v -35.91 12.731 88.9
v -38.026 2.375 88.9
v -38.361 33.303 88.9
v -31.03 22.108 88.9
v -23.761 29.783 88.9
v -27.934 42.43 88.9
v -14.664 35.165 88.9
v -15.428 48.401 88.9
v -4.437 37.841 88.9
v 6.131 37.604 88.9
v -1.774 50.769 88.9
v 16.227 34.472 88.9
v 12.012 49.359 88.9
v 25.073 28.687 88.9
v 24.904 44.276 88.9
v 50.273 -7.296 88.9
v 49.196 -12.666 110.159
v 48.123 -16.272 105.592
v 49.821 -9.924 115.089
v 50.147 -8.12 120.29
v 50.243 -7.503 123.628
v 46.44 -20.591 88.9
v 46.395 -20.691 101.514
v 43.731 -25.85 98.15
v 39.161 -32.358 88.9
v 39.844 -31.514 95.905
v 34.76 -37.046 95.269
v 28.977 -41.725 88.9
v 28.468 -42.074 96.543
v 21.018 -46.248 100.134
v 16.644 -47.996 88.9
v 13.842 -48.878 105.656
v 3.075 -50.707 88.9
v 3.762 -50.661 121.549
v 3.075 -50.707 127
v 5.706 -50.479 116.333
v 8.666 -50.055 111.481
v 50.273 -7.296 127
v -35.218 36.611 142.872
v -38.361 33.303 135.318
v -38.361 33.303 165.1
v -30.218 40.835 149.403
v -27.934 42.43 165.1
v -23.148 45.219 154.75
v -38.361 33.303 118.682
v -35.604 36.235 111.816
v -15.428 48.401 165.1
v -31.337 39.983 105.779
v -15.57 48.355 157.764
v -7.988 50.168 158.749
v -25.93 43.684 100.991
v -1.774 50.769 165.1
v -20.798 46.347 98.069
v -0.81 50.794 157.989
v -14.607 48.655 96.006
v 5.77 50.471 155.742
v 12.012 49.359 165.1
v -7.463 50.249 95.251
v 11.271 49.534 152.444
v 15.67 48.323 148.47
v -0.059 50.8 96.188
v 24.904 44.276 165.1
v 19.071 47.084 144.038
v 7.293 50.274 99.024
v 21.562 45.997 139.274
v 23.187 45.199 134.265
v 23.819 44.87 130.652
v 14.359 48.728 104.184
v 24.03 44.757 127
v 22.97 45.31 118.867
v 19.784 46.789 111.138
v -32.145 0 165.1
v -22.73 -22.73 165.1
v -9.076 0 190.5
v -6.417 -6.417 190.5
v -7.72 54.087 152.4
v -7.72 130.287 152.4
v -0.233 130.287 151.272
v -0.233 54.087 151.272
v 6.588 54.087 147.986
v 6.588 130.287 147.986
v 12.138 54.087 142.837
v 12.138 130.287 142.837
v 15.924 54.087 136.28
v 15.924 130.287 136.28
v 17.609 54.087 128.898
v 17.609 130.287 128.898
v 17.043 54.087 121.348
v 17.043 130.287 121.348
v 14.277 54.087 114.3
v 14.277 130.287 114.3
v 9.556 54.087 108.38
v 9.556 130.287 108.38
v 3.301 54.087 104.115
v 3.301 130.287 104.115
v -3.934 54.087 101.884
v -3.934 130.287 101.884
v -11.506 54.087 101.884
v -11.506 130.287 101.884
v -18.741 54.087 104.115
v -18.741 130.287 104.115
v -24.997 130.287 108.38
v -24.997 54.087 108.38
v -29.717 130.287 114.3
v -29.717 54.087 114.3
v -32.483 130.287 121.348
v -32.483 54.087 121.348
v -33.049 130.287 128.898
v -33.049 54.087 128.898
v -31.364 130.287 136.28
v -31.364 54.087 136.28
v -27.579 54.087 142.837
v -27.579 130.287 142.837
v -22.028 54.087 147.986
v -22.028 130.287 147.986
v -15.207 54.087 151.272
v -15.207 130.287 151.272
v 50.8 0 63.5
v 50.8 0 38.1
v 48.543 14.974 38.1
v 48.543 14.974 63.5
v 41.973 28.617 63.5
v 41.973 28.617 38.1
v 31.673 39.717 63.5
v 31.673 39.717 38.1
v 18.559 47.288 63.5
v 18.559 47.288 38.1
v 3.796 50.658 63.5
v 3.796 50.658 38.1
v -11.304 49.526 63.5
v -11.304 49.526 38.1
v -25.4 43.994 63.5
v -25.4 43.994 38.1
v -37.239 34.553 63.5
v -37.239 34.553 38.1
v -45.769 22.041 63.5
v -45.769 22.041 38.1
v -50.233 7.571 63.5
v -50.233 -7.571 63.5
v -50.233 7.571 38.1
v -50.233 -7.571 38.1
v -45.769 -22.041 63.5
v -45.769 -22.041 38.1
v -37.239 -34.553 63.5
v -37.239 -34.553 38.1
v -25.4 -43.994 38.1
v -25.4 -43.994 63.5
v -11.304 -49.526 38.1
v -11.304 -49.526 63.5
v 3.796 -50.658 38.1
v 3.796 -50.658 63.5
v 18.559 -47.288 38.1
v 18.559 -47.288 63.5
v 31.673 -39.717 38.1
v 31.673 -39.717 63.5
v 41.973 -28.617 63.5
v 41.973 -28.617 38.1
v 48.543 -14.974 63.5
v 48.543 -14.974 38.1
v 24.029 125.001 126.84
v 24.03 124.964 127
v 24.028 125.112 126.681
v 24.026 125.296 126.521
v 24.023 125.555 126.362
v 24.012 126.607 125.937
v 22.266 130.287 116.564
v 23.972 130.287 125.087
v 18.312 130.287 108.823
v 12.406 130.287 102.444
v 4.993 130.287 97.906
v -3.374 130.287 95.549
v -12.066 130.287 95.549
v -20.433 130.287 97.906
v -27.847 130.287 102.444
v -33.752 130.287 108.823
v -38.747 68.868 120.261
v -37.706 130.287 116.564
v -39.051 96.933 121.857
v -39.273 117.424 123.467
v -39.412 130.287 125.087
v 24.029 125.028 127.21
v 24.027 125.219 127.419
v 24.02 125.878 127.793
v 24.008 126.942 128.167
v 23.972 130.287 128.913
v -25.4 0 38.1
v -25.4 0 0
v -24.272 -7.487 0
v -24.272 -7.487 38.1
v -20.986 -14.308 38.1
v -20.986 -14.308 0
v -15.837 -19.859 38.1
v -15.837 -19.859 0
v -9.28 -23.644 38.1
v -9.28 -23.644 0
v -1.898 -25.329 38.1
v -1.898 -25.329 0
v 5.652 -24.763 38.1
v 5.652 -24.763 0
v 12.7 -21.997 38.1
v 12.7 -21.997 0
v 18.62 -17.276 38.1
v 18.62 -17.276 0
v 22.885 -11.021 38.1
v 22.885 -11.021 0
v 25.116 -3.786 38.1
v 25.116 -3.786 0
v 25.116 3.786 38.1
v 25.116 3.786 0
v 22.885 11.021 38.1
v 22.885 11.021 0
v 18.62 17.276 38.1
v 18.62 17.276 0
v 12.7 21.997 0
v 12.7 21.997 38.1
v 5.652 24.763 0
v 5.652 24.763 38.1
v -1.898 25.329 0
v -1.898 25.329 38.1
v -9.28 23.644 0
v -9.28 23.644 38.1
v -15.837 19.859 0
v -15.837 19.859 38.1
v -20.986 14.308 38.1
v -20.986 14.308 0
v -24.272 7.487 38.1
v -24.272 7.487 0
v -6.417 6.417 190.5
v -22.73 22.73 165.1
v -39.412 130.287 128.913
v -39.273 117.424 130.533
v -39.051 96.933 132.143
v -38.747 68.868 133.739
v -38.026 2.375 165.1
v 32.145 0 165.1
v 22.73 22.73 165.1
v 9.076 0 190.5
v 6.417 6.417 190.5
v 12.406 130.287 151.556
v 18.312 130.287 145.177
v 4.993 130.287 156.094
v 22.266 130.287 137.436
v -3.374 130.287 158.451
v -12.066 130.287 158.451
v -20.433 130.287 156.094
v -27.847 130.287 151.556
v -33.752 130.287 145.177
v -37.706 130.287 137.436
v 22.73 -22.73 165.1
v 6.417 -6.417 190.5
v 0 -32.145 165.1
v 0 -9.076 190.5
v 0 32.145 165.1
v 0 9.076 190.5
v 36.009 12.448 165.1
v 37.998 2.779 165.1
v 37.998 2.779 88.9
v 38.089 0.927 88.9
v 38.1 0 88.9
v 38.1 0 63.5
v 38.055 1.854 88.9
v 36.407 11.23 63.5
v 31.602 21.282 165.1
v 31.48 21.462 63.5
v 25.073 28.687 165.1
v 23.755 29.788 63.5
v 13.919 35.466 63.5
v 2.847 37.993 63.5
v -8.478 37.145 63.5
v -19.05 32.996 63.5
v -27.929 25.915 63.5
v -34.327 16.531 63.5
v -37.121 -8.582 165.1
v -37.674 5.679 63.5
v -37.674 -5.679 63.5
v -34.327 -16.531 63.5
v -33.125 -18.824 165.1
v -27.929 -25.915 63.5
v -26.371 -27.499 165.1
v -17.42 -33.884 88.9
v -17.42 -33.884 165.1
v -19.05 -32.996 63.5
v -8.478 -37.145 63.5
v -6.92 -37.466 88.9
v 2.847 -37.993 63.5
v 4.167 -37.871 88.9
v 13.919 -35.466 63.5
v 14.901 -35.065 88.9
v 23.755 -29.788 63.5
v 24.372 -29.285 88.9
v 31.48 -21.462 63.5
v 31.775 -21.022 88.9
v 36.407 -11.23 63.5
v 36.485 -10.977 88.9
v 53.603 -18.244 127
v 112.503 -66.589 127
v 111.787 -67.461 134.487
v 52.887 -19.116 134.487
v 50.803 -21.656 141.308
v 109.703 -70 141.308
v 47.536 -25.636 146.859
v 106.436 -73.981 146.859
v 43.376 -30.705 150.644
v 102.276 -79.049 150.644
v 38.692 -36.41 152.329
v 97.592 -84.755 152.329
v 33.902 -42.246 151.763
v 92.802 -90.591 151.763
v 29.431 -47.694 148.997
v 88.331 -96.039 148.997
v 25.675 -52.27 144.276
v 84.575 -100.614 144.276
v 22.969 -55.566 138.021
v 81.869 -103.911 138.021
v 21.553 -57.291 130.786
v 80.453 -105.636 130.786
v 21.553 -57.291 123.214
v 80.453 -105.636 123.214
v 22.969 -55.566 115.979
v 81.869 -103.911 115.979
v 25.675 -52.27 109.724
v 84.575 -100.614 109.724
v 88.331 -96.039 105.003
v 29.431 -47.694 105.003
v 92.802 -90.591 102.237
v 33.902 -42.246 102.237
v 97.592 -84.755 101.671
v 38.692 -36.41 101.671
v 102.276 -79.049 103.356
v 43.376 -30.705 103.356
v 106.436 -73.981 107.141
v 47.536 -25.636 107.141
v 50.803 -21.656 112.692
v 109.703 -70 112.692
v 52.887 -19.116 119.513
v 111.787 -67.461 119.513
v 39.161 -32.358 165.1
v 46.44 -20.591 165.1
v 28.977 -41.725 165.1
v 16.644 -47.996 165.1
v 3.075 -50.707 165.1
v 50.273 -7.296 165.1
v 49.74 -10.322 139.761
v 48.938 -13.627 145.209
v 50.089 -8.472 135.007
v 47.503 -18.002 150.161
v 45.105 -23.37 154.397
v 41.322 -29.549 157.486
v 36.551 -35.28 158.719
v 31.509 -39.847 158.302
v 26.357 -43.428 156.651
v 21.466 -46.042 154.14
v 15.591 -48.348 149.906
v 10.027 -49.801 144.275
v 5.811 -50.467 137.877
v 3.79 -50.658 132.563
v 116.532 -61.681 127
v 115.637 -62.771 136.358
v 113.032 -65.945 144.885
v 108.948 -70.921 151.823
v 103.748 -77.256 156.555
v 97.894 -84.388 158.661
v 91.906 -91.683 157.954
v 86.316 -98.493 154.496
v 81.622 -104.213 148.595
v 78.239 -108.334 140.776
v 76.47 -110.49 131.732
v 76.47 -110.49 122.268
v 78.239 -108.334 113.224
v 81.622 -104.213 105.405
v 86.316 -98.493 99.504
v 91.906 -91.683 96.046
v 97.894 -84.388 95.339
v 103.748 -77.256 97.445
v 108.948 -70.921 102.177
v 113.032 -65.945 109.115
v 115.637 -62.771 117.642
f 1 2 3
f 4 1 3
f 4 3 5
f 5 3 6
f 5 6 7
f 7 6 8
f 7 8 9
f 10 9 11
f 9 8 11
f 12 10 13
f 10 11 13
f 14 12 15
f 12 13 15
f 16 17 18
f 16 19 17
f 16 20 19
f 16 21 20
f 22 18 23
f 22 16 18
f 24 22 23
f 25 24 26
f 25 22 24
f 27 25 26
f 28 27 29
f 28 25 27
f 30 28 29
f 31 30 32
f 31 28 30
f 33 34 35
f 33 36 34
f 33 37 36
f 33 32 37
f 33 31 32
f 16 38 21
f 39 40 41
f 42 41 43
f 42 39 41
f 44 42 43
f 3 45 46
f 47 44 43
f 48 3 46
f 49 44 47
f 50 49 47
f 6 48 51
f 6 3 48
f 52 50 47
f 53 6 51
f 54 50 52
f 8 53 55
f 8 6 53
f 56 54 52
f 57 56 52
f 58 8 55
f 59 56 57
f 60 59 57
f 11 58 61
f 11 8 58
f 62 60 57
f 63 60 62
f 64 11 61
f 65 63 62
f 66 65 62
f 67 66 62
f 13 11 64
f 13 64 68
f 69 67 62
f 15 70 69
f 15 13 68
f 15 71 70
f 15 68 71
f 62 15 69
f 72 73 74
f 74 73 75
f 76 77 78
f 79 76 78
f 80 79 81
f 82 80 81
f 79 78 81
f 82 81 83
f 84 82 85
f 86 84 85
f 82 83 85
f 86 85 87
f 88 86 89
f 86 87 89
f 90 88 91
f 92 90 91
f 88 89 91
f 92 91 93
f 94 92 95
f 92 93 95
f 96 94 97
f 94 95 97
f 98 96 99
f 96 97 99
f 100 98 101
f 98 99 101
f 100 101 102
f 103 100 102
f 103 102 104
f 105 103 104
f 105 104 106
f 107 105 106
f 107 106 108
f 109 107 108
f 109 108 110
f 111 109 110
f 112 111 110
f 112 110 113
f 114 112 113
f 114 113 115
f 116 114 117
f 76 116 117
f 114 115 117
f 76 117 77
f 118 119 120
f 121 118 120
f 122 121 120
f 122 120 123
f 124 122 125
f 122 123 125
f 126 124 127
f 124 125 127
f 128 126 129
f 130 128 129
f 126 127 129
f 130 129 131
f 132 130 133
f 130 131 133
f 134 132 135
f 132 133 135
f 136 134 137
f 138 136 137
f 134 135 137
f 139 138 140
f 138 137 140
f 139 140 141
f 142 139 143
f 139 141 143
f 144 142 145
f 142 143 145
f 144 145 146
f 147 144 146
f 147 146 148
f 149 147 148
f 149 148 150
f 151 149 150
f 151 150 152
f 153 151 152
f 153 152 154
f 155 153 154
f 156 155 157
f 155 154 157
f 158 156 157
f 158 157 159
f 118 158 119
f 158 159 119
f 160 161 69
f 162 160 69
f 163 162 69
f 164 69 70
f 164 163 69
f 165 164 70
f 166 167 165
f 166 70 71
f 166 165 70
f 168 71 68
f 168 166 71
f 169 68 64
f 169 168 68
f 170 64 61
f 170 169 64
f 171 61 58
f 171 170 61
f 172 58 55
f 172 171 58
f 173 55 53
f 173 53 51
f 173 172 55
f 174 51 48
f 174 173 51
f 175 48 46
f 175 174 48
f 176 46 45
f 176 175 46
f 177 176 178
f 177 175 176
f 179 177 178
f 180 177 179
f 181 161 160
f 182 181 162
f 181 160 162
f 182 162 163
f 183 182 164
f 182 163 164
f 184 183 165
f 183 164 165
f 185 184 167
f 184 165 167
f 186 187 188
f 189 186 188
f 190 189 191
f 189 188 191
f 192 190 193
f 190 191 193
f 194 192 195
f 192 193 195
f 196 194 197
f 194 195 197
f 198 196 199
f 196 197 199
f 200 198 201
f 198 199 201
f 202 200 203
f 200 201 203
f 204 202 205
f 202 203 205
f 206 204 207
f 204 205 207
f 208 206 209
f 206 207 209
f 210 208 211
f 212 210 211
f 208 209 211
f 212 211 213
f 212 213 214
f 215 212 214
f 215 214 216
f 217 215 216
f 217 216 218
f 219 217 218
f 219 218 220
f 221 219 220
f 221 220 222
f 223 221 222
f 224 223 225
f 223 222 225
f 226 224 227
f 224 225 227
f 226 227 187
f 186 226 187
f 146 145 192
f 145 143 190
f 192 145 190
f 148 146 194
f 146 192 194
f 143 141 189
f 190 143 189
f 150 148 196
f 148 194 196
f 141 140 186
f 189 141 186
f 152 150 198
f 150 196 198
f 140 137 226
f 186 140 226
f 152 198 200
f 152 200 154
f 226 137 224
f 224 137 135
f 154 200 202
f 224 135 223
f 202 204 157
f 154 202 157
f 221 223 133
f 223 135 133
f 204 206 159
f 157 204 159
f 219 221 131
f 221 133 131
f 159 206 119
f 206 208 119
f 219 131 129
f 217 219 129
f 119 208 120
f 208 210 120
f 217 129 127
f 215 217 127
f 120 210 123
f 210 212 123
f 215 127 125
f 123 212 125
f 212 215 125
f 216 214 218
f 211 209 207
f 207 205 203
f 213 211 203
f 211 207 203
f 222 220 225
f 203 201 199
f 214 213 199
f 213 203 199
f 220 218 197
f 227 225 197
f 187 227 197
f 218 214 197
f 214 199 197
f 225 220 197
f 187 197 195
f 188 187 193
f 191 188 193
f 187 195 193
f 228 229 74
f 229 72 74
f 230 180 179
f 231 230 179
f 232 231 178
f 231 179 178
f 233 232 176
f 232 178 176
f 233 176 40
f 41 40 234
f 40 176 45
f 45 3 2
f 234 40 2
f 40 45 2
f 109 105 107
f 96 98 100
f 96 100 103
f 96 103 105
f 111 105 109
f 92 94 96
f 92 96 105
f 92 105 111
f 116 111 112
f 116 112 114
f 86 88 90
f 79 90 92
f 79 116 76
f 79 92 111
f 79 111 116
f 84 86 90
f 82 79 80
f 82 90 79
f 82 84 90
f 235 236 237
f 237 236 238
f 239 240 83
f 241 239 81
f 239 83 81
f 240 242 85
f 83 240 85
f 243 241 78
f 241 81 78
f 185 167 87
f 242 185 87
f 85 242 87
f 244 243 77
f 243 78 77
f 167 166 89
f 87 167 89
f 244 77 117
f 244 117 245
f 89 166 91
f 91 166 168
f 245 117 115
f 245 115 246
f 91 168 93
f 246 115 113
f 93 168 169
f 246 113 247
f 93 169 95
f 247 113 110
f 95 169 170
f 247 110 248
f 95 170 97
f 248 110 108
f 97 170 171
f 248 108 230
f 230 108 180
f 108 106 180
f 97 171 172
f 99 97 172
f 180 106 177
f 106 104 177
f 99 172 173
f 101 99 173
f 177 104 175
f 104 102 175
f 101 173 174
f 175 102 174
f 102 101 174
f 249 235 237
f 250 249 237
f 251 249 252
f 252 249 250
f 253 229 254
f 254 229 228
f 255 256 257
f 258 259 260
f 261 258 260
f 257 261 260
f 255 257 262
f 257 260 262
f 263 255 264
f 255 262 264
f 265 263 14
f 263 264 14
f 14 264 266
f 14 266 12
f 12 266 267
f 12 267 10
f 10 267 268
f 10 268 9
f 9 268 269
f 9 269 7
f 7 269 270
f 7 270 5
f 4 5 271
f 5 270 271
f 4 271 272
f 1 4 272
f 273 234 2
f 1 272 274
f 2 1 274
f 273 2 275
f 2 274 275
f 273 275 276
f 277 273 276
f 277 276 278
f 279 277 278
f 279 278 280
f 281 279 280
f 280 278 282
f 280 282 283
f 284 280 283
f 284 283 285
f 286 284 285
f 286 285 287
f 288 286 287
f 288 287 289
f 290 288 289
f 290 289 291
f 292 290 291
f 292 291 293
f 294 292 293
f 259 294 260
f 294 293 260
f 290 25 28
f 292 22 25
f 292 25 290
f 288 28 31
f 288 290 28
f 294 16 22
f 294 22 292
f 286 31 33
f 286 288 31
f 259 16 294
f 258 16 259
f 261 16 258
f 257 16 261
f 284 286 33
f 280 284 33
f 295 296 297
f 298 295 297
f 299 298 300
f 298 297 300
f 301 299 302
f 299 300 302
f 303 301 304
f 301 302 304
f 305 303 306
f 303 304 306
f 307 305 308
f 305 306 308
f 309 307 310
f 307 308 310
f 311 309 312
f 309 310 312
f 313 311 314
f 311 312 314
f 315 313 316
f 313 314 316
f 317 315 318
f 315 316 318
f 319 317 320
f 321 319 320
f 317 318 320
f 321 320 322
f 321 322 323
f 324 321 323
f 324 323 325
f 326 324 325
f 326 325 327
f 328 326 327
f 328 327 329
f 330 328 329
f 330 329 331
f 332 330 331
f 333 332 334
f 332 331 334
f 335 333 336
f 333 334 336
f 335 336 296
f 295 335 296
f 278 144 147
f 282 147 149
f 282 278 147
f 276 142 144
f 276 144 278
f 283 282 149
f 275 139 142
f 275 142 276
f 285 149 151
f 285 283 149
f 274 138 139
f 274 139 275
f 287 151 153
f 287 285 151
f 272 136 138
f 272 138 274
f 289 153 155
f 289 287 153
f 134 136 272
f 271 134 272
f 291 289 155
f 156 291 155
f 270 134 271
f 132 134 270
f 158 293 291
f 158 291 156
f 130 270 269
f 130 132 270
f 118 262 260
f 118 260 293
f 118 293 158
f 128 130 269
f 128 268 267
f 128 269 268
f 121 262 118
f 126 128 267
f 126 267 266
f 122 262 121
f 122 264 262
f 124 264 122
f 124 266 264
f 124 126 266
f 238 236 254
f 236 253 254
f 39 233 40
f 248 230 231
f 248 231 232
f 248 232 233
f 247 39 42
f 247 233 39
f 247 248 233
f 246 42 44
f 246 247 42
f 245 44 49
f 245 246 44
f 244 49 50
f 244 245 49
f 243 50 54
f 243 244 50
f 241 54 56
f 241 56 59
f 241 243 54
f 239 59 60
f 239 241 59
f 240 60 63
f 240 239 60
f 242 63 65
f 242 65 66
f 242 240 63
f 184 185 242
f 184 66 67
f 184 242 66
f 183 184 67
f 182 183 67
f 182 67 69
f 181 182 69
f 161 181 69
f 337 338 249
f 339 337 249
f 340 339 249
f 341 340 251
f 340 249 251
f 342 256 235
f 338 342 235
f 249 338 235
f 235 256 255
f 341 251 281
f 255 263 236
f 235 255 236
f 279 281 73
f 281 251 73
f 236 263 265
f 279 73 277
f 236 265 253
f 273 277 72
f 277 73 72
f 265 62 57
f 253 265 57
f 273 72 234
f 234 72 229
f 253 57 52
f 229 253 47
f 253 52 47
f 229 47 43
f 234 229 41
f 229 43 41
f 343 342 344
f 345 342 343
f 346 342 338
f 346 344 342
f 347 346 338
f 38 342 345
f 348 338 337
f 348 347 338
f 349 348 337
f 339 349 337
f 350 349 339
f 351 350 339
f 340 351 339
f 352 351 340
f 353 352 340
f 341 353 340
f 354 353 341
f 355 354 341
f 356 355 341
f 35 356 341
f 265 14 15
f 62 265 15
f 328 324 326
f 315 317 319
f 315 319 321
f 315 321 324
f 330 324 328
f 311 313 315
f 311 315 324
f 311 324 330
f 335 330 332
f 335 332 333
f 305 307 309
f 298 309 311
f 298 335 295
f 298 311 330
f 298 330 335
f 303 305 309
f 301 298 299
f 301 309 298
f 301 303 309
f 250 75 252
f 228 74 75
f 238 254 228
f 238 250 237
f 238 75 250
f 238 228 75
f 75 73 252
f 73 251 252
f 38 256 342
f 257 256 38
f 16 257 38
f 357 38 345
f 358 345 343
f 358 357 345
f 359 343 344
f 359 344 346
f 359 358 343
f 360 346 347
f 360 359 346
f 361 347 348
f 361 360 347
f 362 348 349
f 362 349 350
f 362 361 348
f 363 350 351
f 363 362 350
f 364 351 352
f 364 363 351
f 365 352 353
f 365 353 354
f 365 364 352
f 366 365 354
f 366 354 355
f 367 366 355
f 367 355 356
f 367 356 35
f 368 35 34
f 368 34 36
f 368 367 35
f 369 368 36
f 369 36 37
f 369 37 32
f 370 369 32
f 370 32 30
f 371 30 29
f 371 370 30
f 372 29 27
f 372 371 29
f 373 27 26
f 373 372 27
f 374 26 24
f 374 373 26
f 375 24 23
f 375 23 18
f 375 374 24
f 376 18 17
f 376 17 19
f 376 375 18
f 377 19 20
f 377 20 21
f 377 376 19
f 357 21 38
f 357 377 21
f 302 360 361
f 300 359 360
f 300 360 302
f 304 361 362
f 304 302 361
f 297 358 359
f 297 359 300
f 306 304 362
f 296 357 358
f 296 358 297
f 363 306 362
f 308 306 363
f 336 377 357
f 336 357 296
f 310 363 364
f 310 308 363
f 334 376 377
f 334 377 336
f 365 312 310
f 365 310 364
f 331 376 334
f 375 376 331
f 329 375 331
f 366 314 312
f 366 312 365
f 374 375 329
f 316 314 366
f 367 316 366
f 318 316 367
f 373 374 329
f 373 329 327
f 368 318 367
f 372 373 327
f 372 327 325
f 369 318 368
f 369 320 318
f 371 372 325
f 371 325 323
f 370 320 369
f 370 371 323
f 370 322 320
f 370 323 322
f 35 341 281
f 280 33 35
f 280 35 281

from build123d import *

# Parameters (mm, degrees)
SKETCH1_R               = 25.4
BOSS_EXTRUDE1_DEPTH     = 38.1
SKETCH2_R               = 50.8
BOSS_EXTRUDE2_DEPTH     = 25.4
SKETCH3_R               = 38.1
BOSS_EXTRUDE3_DEPTH     = 101.6
BOSS_EXTRUDE4_START     = -76.2
BOSS_EXTRUDE4_DEPTH     = 76.2
CUT_EXTRUDE1_REACH      = 316.552
CUT_EXTRUDE1_END_RADIUS = 50.8
SKETCH5_W               = 68.464599232
SKETCH5_H               = 81.28
SKETCH5_R               = 31.75
CUT_EXTRUDE2_REACH      = 310.247
CUT_EXTRUDE2_END_RADIUS = 50.8
SKETCH6_W               = 81.28
SKETCH6_H               = 68.58
SKETCH6_R               = 31.75
SKETCH7_R               = 25.4
CUT_EXTRUDE3_DEPTH      = 76.2
SKETCH8_R               = 25.4
CUT_EXTRUDE4_DEPTH      = 76.2
BOSS_EXTRUDE5_DEPTH     = 25.4
BOSS_EXTRUDE5_TAPER     = 40


with BuildPart() as part:
    # Sketch1 → Boss-Extrude1 (new body)
    with BuildSketch(Plane.XY):
        with Locations(Location((0, 0, 0), (0, 0, 180))):
            Circle(SKETCH1_R)
    extrude(amount=BOSS_EXTRUDE1_DEPTH)

    # Sketch2 → Boss-Extrude2 (add)
    with BuildSketch(Plane.XY.offset(38.1)):
        Circle(SKETCH2_R)
    extrude(amount=BOSS_EXTRUDE2_DEPTH)

    # Sketch3 → Boss-Extrude3 (add)
    with BuildSketch(Plane.XY.offset(63.5)):
        Circle(SKETCH3_R)
    extrude(amount=BOSS_EXTRUDE3_DEPTH)

    # Sketch4 → Boss-Extrude4 (add)
    with BuildSketch(Plane.XY.offset(165.1).offset(BOSS_EXTRUDE4_START)):
        with BuildLine():
            Line((37.998495941, 2.779263607), (116.531903161, -61.680521923))
            Line((116.531903161, -61.680521923), (76.244537205, -110.763901435))
            Line((76.244537205, -110.763901435), (-17.420498723, -33.884158898))
            ThreePointArc((-17.420498723, -33.884158898), (21.021777513, -31.775696219), (37.998495941, 2.779263607))
        make_face()
        with BuildLine():
            Line((25.073469731, 28.686775972), (23.972164439, 130.286775972))
            Line((23.972164439, 130.286775972), (-39.412434793, 130.286775972))
            Line((-39.412434793, 130.286775972), (-38.025917527, 2.374783413))
            ThreePointArc((-38.025917527, 2.374783413), (-14.663618724, 35.165157271), (25.073469731, 28.686775972))
        make_face()
    extrude(amount=BOSS_EXTRUDE4_DEPTH)

    # Cut-Extrude1: up to this cylinder (the profile starts outside it)
    cut_extrude1_end = Plane(origin=(0, 0, 166.577275), z_dir=(0, 0, -1)) * Cylinder(CUT_EXTRUDE1_END_RADIUS, 735.704, mode=Mode.PRIVATE)
    # Sketch5 → Cut-Extrude1 (cut, up to the surface)
    with BuildSketch(Plane(origin=(0, 130.286775972, 0), x_dir=(1, 0, 0), z_dir=(0, 1, 0)), mode=Mode.PRIVATE) as cut_extrude1_sk1:
        with Locations((-7.720135177, -127)):
            Rectangle(SKETCH5_W, SKETCH5_H)
        with Locations((-7.720135177, -127)):
            Circle(SKETCH5_R, mode=Mode.SUBTRACT)
    cut_extrude1_tool1 = extrude(cut_extrude1_sk1.sketch, amount=-CUT_EXTRUDE1_REACH, mode=Mode.PRIVATE) - cut_extrude1_end
    add(cut_extrude1_tool1.solids().sort_by_distance((-7.720135, 130.286776, 166.577275))[0], mode=Mode.SUBTRACT)

    # Cut-Extrude2: up to this cylinder (the profile starts outside it)
    cut_extrude2_end = Plane(origin=(0, 0, 166.576531), z_dir=(0, 0, -1)) * Cylinder(CUT_EXTRUDE2_END_RADIUS, 723.094, mode=Mode.PRIVATE)
    # Sketch6 → Cut-Extrude2 (cut, up to the surface)
    with BuildSketch(Plane(origin=(99.87368094, -81.975763963, 0), x_dir=(0, 0, -1), z_dir=(0.7729666064892688, -0.6344467079688128, 0)), mode=Mode.PRIVATE) as cut_extrude2_sk1:
        with Locations((-127, -5.493701383)):
            Rectangle(SKETCH6_W, SKETCH6_H)
        with Locations(Location((-127, -5.493701383, 0), (0, 0, 90))):
            Circle(SKETCH6_R, mode=Mode.SUBTRACT)
    cut_extrude2_tool1 = extrude(cut_extrude2_sk1.sketch, amount=-CUT_EXTRUDE2_REACH, mode=Mode.PRIVATE) - cut_extrude2_end
    add(cut_extrude2_tool1.solids().sort_by_distance((96.38822, -86.222212, 166.576531))[0], mode=Mode.SUBTRACT)

    # Sketch7 → Cut-Extrude3 (cut)
    with BuildSketch(Plane(origin=(99.87368094, -81.975763963, 0), x_dir=(0, 0, -1), z_dir=(0.7729666064892688, -0.6344467079688128, 0))):
        with Locations(Location((-127, -5.493701383, 0), (0, 0, 90))):
            Circle(SKETCH7_R)
    extrude(amount=-CUT_EXTRUDE3_DEPTH, mode=Mode.SUBTRACT)

    # Sketch8 → Cut-Extrude4 (cut)
    with BuildSketch(Plane(origin=(0, 130.286775972, 0), x_dir=(1, 0, 0), z_dir=(0, 1, 0))):
        with Locations(Location((-7.720135177, -127, 0), (0, 0, 270))):
            Circle(SKETCH8_R)
    extrude(amount=-CUT_EXTRUDE4_DEPTH, mode=Mode.SUBTRACT)

    # Sketch10 → Boss-Extrude5 (add)
    with BuildSketch(Plane.XY.offset(165.1)):
        Polygon((32.144869663, 0), (22.729855319, 22.729855319), (0, 32.144869663), (-22.729855319, 22.729855319), (-32.144869663, 0), (-22.729855319, -22.729855319), (0, -32.144869663), (22.729855319, -22.729855319), align=None)
    extrude(amount=BOSS_EXTRUDE5_DEPTH, taper=BOSS_EXTRUDE5_TAPER)


solid = part.part
